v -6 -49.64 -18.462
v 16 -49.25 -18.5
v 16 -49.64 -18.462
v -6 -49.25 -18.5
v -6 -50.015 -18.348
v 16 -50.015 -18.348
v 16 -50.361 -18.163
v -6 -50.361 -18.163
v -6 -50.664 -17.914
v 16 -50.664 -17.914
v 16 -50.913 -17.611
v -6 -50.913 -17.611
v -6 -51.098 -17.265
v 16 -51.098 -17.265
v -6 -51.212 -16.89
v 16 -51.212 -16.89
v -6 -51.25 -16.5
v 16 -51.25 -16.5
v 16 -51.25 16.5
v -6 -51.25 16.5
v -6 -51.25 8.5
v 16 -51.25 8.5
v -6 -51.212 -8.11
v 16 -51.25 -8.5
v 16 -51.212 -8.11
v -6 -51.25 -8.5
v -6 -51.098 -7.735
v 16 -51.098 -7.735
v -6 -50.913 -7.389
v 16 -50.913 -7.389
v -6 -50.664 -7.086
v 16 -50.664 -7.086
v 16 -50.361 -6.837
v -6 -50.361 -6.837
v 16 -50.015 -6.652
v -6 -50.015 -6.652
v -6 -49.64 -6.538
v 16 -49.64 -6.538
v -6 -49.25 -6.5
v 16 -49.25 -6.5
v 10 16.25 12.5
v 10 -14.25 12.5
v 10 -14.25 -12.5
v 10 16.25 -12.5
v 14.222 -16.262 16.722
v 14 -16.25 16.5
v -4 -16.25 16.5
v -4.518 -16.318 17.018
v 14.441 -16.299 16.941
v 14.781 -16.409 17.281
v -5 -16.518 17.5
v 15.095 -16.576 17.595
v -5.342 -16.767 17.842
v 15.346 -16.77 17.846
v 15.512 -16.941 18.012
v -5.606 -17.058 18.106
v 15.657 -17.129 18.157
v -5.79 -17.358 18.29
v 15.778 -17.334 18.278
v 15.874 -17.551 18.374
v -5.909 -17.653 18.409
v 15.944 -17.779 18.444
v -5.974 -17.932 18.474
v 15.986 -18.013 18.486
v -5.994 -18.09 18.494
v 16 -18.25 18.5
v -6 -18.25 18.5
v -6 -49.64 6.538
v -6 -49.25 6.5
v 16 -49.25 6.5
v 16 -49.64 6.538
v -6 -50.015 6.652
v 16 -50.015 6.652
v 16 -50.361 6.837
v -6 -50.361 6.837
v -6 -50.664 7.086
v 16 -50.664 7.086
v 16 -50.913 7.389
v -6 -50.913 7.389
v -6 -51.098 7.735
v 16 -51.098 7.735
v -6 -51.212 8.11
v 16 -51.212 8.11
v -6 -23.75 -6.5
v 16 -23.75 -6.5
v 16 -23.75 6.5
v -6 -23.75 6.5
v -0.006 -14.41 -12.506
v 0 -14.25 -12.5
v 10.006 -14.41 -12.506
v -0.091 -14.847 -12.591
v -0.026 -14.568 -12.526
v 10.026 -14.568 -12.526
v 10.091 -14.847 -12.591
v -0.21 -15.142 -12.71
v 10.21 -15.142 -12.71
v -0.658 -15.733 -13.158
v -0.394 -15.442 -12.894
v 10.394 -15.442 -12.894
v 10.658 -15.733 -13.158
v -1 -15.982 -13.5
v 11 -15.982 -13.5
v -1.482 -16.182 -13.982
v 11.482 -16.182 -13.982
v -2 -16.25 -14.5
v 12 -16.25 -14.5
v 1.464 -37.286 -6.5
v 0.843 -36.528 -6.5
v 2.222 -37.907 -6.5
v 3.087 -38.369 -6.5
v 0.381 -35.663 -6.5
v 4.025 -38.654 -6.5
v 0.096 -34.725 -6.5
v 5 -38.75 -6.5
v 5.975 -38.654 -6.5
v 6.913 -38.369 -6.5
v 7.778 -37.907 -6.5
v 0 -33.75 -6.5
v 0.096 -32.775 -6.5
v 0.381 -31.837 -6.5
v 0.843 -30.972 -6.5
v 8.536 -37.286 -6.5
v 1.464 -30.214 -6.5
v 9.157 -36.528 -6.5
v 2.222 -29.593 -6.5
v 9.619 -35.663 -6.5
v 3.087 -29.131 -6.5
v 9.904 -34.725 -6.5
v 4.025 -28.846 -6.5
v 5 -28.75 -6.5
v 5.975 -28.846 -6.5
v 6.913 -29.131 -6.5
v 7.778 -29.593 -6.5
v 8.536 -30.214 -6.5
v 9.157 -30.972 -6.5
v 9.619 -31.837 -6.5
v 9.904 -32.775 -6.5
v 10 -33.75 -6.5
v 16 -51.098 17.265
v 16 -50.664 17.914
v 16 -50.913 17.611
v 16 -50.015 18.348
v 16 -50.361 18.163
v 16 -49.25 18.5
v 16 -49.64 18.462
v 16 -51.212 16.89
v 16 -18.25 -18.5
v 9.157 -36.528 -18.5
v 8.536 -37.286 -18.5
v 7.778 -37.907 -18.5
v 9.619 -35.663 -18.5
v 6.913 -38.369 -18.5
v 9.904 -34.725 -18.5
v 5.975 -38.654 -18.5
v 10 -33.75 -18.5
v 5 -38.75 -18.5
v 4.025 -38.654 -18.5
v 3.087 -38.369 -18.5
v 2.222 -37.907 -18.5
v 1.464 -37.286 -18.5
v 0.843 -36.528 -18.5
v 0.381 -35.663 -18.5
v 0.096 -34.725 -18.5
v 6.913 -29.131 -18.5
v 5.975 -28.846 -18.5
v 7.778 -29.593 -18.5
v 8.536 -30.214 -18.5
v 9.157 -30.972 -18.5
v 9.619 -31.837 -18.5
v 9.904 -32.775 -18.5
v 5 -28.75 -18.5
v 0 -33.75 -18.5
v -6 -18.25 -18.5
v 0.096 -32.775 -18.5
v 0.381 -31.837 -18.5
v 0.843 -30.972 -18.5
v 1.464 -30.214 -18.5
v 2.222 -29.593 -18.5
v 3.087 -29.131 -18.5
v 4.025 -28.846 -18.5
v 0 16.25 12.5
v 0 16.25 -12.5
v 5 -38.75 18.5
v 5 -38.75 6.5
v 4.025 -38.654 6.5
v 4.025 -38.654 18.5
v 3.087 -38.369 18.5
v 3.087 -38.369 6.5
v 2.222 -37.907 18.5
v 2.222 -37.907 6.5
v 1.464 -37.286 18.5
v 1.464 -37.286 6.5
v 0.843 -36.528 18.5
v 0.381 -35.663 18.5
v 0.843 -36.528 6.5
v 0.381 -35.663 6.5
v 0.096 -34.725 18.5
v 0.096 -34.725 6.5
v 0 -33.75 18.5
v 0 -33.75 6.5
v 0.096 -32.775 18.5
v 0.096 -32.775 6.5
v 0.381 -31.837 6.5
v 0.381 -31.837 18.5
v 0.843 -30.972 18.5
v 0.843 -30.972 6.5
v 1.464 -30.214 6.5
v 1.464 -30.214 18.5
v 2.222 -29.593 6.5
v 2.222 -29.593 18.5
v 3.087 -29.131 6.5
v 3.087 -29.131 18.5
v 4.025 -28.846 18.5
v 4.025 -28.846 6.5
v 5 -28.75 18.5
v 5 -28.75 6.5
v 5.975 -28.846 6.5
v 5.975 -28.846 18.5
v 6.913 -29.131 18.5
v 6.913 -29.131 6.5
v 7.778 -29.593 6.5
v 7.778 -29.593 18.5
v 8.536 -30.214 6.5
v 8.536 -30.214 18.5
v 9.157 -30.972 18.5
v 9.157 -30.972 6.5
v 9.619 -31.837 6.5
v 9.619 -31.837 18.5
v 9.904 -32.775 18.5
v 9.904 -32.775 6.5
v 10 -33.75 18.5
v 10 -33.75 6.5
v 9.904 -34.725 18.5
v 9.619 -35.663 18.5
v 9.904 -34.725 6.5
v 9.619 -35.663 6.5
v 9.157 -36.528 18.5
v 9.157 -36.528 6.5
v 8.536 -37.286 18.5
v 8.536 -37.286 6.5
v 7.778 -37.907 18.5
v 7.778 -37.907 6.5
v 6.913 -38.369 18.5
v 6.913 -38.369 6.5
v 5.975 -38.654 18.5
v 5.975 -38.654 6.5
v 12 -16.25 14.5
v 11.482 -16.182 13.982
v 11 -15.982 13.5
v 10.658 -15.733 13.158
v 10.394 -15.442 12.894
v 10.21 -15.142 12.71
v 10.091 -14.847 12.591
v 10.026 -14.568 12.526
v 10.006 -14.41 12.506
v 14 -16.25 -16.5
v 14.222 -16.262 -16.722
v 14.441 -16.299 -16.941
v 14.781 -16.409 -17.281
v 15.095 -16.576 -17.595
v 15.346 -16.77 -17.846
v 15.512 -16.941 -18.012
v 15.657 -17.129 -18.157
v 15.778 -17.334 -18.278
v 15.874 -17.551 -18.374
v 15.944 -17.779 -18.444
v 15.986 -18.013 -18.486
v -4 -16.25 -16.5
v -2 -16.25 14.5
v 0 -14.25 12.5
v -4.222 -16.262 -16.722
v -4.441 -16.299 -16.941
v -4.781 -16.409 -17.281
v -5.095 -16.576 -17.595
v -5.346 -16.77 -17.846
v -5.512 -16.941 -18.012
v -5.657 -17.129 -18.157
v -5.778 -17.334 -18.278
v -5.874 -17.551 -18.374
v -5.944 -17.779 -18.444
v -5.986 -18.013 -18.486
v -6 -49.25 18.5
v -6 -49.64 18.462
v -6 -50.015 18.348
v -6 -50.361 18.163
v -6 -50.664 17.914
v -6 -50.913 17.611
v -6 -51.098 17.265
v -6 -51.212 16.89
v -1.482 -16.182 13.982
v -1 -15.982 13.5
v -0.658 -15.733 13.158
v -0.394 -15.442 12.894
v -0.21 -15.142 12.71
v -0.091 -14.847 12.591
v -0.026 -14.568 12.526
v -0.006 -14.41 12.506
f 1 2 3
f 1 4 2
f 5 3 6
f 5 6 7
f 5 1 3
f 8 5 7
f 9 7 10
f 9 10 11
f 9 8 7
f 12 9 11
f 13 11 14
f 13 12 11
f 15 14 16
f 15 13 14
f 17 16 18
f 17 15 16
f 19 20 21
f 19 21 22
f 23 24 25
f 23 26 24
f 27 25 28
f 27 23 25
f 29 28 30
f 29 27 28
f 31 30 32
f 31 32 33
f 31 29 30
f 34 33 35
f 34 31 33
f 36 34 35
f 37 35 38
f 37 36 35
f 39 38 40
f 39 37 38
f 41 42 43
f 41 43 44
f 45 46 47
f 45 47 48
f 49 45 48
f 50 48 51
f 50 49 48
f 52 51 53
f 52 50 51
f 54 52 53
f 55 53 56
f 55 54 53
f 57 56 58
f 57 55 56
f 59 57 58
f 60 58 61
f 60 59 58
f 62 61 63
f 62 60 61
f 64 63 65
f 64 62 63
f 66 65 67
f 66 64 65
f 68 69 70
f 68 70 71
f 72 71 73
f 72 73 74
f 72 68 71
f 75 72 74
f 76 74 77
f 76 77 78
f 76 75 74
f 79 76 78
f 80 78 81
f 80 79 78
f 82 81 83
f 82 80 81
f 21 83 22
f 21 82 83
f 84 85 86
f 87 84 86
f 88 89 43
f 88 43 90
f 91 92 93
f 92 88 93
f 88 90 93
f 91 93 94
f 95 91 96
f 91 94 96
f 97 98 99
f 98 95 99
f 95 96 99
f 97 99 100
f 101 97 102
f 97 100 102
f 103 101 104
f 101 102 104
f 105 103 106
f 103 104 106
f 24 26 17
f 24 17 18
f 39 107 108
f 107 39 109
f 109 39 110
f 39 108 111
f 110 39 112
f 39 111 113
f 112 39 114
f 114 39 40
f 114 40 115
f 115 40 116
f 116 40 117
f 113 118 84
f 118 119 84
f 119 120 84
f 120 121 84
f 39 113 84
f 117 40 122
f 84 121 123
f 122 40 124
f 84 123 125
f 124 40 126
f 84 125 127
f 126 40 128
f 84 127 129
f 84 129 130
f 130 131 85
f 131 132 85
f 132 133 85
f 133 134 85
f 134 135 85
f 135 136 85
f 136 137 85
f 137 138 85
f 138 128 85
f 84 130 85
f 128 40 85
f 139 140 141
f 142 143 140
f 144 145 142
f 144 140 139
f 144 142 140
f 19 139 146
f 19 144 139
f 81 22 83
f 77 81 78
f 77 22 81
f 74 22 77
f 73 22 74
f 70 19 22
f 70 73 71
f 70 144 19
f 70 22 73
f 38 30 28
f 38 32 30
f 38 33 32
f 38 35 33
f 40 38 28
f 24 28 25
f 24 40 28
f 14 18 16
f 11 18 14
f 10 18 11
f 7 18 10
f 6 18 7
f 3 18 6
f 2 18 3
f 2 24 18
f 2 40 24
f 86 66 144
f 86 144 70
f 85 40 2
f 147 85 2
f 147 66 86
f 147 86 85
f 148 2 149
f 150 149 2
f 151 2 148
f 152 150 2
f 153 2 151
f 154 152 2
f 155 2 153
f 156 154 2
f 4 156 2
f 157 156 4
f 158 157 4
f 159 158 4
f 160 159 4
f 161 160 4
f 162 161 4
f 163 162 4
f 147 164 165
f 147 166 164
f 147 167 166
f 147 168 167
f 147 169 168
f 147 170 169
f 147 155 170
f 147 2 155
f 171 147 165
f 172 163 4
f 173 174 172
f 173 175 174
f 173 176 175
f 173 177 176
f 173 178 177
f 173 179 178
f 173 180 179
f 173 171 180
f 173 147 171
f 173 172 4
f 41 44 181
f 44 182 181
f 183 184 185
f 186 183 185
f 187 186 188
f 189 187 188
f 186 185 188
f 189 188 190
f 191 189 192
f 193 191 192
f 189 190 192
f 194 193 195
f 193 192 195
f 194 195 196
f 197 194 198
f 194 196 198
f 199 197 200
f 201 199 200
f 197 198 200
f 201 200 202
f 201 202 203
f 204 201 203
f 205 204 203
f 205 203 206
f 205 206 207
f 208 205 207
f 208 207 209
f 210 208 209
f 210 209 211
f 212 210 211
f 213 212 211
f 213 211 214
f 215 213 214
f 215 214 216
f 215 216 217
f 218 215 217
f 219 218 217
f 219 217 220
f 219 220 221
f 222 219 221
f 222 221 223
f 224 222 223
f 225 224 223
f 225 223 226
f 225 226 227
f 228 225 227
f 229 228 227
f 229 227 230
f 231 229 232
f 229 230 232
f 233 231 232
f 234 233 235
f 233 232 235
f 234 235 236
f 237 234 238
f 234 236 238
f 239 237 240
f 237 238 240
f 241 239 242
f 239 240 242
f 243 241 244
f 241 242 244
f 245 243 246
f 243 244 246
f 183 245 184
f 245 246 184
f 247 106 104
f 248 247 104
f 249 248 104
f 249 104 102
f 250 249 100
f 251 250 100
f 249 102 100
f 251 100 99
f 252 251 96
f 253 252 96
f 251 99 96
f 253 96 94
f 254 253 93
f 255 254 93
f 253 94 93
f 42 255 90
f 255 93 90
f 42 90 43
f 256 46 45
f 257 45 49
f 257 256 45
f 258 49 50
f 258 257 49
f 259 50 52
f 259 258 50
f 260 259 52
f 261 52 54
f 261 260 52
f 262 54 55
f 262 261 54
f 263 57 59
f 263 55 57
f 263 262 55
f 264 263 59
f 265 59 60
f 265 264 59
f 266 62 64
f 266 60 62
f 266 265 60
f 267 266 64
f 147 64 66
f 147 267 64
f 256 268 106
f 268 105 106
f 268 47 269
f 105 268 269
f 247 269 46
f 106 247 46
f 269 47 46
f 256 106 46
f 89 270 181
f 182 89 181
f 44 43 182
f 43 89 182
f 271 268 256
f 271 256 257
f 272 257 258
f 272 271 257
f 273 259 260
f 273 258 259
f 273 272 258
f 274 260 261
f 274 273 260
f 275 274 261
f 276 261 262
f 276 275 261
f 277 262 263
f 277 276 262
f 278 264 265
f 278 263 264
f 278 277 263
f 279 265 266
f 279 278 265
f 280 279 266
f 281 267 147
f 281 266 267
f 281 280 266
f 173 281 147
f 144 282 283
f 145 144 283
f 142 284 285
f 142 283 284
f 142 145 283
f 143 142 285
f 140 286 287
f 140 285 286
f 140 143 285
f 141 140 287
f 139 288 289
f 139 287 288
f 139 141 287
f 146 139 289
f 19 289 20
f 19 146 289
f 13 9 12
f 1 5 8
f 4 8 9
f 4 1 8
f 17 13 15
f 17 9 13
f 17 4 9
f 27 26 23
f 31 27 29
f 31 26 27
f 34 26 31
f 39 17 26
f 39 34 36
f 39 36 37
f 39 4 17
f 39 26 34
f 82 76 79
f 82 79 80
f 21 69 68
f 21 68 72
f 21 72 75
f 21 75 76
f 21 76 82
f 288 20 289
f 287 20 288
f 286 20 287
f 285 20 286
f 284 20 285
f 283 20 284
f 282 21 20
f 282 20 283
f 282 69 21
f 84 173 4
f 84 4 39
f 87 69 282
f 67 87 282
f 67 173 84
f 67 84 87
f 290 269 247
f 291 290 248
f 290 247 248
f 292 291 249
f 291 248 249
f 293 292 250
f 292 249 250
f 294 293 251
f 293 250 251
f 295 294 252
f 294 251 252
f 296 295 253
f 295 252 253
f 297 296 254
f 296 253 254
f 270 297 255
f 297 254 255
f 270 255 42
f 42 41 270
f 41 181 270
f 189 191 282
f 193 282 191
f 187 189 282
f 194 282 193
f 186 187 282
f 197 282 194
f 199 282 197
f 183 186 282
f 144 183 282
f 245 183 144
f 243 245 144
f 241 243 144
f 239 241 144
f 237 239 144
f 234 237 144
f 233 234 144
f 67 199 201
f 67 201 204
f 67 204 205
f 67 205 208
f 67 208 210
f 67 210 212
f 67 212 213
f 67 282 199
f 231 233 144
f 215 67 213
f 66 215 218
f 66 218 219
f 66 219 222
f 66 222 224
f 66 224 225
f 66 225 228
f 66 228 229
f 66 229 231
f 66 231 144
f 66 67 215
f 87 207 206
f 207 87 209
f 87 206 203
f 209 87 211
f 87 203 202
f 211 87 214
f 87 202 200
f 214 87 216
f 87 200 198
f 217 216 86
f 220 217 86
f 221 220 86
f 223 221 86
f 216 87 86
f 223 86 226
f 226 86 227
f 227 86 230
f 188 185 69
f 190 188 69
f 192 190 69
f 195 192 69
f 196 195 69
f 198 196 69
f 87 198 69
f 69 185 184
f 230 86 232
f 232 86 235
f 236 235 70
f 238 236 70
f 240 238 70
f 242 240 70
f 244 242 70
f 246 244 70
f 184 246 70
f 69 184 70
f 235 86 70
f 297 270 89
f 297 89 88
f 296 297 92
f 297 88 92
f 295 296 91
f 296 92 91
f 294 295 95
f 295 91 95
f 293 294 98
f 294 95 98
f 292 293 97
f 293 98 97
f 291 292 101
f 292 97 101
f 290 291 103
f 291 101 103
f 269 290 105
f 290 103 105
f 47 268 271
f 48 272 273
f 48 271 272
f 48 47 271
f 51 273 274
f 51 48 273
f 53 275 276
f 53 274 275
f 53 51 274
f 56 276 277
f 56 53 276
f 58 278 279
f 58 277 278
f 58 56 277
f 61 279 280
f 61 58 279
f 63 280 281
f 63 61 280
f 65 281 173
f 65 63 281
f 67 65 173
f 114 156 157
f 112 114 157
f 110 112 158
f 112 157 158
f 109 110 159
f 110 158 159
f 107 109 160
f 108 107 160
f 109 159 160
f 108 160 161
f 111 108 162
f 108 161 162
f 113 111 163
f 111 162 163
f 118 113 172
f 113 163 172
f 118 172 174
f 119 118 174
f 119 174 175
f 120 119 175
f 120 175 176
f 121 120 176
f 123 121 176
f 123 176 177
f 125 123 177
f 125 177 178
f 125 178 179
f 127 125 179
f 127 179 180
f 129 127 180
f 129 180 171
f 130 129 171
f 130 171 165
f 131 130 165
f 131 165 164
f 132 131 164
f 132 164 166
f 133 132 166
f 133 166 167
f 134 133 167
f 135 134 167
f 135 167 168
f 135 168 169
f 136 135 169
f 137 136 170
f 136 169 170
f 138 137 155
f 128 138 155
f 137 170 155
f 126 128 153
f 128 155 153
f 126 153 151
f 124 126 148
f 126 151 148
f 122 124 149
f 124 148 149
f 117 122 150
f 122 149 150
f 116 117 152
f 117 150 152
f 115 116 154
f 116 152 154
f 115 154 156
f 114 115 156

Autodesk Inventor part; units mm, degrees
ref_plane "YZ Plane" through (0, 0, 0) normal (1, 0, 0) x (0, 1, 0)
ref_plane "XZ Plane" through (0, 0, 0) normal (0, 1, 0) x (-1, 0, 0)
ref_plane "XY Plane" through (0, 0, 0) normal (0, 0, 1) x (1, 0, 0)
sketch "Sketch1" plane through (0, 0, 0) normal (1, 0, 0) x (0, 1, 0)
  line L0 (16.25, 12.5) -> (-16.25, 12.5)
  line L1 (-16.25, 12.5) -> (-16.25, -12.5)
  line L2 (-16.25, -12.5) -> (16.25, -12.5)
  line L3 (16.25, -12.5) -> (16.25, 12.5)
  point P0 (0, 0)
  dimension "d0" = 25
  dimension "d1" = 32.5
  dimension "d2" = 16.25
  dimension "d3" = 12.5
extrude "sandwich_plate" add sketch "Sketch1" along normal blind 10
sketch "Sketch2" plane through (0, -16.25, -12.5) normal (0, -1, 0) x (1, 0, 0)
  line L0 (16, -6) -> (-6, -6)
  line L1 (-6, -6) -> (-6, 31)
  line L2 (-6, 31) -> (16, 31)
  line L3 (16, 31) -> (16, -6)
  line L4 (0, 25) -> (10, 25) projected
  line L5 (0, 0) -> (10, 0) projected
  line L6 (10, 25) -> (10, 0) projected
  line L7 (0, 25) -> (0, 0) projected
  point P0 (0, 12.5)
  dimension "d9" = 6
  dimension "d10" = 6
  dimension "d11" = 6
  dimension "d12" = 6
extrude "clamp_length" add sketch "Sketch2" along normal blind 35 contours L0 L1 L2 L3 | L4 L6 L5 L7
sketch "Sketch3" plane through (16, -16.25, 18.5) normal (1, 0, 0) x (0, 0, -1)
  line L0 (0, -35) -> (37, -35) projected
  line L1 (12, -35) -> (25, -35)
  line L2 (25, -35) -> (25, -7.5)
  line L3 (25, -7.5) -> (12, -7.5)
  line L4 (12, -7.5) -> (12, -35)
  line L5 (37, 0) -> (0, 0) projected
  line L6 (0, 0) -> (0, -35) projected
  line L7 (37, 0) -> (37, -35) projected
  point P0 (18.5, 16.25)
  dimension "d14" = 7.5
  dimension "d15" = 12
  dimension "d16" = 12
extrude "slot" cut sketch "Sketch3" against normal through all contours L4 L3 L2 L0
fillet "Fillet1" radius 2 12 edges at (5, -16.25, 12.5) (10, -16.25, 0) (0, -16.25, 0) (5, -16.25, -12.5) (16, -16.25, 0) (5, -16.25, 18.5) (-6, -16.25, 0) (5, -16.25, -18.5) (5, -51.25, 6.5) (5, -51.25, -6.5) (5, -51.25, 18.5) (5, -51.25, -18.5)
sketch "Sketch4" plane through (-6, -51.25, 18.5) normal (0, 0, 1) x (1, 0, 0)
  line L0 (22, 33) -> (22, 0) projected
  line L1 (22, 0) -> (0, 0) projected
  point P0 (6, 51.25)
  point P1 (11, 17.5)
  dimension "d20" = 11
  dimension "d21" = 17.5
hole "Hole1" at (5, -33.75, 18.5) direction (0, 0, -1) diameter 10 end through all
equation "\"d2\" = 0.5 * d1"
equation "\"d3\" = 0.5 * d0"
equation "\"d10\" = d9"
equation "\"d11\" = d9"
equation "\"d12\" = d11"
equation "\"d16\" = d15"
equation "\"d21\" = 0.5 * d7"
equation "\"d7\" = 35"
properties part number "support_sandwichPlate" material "Steel, Carbon"
